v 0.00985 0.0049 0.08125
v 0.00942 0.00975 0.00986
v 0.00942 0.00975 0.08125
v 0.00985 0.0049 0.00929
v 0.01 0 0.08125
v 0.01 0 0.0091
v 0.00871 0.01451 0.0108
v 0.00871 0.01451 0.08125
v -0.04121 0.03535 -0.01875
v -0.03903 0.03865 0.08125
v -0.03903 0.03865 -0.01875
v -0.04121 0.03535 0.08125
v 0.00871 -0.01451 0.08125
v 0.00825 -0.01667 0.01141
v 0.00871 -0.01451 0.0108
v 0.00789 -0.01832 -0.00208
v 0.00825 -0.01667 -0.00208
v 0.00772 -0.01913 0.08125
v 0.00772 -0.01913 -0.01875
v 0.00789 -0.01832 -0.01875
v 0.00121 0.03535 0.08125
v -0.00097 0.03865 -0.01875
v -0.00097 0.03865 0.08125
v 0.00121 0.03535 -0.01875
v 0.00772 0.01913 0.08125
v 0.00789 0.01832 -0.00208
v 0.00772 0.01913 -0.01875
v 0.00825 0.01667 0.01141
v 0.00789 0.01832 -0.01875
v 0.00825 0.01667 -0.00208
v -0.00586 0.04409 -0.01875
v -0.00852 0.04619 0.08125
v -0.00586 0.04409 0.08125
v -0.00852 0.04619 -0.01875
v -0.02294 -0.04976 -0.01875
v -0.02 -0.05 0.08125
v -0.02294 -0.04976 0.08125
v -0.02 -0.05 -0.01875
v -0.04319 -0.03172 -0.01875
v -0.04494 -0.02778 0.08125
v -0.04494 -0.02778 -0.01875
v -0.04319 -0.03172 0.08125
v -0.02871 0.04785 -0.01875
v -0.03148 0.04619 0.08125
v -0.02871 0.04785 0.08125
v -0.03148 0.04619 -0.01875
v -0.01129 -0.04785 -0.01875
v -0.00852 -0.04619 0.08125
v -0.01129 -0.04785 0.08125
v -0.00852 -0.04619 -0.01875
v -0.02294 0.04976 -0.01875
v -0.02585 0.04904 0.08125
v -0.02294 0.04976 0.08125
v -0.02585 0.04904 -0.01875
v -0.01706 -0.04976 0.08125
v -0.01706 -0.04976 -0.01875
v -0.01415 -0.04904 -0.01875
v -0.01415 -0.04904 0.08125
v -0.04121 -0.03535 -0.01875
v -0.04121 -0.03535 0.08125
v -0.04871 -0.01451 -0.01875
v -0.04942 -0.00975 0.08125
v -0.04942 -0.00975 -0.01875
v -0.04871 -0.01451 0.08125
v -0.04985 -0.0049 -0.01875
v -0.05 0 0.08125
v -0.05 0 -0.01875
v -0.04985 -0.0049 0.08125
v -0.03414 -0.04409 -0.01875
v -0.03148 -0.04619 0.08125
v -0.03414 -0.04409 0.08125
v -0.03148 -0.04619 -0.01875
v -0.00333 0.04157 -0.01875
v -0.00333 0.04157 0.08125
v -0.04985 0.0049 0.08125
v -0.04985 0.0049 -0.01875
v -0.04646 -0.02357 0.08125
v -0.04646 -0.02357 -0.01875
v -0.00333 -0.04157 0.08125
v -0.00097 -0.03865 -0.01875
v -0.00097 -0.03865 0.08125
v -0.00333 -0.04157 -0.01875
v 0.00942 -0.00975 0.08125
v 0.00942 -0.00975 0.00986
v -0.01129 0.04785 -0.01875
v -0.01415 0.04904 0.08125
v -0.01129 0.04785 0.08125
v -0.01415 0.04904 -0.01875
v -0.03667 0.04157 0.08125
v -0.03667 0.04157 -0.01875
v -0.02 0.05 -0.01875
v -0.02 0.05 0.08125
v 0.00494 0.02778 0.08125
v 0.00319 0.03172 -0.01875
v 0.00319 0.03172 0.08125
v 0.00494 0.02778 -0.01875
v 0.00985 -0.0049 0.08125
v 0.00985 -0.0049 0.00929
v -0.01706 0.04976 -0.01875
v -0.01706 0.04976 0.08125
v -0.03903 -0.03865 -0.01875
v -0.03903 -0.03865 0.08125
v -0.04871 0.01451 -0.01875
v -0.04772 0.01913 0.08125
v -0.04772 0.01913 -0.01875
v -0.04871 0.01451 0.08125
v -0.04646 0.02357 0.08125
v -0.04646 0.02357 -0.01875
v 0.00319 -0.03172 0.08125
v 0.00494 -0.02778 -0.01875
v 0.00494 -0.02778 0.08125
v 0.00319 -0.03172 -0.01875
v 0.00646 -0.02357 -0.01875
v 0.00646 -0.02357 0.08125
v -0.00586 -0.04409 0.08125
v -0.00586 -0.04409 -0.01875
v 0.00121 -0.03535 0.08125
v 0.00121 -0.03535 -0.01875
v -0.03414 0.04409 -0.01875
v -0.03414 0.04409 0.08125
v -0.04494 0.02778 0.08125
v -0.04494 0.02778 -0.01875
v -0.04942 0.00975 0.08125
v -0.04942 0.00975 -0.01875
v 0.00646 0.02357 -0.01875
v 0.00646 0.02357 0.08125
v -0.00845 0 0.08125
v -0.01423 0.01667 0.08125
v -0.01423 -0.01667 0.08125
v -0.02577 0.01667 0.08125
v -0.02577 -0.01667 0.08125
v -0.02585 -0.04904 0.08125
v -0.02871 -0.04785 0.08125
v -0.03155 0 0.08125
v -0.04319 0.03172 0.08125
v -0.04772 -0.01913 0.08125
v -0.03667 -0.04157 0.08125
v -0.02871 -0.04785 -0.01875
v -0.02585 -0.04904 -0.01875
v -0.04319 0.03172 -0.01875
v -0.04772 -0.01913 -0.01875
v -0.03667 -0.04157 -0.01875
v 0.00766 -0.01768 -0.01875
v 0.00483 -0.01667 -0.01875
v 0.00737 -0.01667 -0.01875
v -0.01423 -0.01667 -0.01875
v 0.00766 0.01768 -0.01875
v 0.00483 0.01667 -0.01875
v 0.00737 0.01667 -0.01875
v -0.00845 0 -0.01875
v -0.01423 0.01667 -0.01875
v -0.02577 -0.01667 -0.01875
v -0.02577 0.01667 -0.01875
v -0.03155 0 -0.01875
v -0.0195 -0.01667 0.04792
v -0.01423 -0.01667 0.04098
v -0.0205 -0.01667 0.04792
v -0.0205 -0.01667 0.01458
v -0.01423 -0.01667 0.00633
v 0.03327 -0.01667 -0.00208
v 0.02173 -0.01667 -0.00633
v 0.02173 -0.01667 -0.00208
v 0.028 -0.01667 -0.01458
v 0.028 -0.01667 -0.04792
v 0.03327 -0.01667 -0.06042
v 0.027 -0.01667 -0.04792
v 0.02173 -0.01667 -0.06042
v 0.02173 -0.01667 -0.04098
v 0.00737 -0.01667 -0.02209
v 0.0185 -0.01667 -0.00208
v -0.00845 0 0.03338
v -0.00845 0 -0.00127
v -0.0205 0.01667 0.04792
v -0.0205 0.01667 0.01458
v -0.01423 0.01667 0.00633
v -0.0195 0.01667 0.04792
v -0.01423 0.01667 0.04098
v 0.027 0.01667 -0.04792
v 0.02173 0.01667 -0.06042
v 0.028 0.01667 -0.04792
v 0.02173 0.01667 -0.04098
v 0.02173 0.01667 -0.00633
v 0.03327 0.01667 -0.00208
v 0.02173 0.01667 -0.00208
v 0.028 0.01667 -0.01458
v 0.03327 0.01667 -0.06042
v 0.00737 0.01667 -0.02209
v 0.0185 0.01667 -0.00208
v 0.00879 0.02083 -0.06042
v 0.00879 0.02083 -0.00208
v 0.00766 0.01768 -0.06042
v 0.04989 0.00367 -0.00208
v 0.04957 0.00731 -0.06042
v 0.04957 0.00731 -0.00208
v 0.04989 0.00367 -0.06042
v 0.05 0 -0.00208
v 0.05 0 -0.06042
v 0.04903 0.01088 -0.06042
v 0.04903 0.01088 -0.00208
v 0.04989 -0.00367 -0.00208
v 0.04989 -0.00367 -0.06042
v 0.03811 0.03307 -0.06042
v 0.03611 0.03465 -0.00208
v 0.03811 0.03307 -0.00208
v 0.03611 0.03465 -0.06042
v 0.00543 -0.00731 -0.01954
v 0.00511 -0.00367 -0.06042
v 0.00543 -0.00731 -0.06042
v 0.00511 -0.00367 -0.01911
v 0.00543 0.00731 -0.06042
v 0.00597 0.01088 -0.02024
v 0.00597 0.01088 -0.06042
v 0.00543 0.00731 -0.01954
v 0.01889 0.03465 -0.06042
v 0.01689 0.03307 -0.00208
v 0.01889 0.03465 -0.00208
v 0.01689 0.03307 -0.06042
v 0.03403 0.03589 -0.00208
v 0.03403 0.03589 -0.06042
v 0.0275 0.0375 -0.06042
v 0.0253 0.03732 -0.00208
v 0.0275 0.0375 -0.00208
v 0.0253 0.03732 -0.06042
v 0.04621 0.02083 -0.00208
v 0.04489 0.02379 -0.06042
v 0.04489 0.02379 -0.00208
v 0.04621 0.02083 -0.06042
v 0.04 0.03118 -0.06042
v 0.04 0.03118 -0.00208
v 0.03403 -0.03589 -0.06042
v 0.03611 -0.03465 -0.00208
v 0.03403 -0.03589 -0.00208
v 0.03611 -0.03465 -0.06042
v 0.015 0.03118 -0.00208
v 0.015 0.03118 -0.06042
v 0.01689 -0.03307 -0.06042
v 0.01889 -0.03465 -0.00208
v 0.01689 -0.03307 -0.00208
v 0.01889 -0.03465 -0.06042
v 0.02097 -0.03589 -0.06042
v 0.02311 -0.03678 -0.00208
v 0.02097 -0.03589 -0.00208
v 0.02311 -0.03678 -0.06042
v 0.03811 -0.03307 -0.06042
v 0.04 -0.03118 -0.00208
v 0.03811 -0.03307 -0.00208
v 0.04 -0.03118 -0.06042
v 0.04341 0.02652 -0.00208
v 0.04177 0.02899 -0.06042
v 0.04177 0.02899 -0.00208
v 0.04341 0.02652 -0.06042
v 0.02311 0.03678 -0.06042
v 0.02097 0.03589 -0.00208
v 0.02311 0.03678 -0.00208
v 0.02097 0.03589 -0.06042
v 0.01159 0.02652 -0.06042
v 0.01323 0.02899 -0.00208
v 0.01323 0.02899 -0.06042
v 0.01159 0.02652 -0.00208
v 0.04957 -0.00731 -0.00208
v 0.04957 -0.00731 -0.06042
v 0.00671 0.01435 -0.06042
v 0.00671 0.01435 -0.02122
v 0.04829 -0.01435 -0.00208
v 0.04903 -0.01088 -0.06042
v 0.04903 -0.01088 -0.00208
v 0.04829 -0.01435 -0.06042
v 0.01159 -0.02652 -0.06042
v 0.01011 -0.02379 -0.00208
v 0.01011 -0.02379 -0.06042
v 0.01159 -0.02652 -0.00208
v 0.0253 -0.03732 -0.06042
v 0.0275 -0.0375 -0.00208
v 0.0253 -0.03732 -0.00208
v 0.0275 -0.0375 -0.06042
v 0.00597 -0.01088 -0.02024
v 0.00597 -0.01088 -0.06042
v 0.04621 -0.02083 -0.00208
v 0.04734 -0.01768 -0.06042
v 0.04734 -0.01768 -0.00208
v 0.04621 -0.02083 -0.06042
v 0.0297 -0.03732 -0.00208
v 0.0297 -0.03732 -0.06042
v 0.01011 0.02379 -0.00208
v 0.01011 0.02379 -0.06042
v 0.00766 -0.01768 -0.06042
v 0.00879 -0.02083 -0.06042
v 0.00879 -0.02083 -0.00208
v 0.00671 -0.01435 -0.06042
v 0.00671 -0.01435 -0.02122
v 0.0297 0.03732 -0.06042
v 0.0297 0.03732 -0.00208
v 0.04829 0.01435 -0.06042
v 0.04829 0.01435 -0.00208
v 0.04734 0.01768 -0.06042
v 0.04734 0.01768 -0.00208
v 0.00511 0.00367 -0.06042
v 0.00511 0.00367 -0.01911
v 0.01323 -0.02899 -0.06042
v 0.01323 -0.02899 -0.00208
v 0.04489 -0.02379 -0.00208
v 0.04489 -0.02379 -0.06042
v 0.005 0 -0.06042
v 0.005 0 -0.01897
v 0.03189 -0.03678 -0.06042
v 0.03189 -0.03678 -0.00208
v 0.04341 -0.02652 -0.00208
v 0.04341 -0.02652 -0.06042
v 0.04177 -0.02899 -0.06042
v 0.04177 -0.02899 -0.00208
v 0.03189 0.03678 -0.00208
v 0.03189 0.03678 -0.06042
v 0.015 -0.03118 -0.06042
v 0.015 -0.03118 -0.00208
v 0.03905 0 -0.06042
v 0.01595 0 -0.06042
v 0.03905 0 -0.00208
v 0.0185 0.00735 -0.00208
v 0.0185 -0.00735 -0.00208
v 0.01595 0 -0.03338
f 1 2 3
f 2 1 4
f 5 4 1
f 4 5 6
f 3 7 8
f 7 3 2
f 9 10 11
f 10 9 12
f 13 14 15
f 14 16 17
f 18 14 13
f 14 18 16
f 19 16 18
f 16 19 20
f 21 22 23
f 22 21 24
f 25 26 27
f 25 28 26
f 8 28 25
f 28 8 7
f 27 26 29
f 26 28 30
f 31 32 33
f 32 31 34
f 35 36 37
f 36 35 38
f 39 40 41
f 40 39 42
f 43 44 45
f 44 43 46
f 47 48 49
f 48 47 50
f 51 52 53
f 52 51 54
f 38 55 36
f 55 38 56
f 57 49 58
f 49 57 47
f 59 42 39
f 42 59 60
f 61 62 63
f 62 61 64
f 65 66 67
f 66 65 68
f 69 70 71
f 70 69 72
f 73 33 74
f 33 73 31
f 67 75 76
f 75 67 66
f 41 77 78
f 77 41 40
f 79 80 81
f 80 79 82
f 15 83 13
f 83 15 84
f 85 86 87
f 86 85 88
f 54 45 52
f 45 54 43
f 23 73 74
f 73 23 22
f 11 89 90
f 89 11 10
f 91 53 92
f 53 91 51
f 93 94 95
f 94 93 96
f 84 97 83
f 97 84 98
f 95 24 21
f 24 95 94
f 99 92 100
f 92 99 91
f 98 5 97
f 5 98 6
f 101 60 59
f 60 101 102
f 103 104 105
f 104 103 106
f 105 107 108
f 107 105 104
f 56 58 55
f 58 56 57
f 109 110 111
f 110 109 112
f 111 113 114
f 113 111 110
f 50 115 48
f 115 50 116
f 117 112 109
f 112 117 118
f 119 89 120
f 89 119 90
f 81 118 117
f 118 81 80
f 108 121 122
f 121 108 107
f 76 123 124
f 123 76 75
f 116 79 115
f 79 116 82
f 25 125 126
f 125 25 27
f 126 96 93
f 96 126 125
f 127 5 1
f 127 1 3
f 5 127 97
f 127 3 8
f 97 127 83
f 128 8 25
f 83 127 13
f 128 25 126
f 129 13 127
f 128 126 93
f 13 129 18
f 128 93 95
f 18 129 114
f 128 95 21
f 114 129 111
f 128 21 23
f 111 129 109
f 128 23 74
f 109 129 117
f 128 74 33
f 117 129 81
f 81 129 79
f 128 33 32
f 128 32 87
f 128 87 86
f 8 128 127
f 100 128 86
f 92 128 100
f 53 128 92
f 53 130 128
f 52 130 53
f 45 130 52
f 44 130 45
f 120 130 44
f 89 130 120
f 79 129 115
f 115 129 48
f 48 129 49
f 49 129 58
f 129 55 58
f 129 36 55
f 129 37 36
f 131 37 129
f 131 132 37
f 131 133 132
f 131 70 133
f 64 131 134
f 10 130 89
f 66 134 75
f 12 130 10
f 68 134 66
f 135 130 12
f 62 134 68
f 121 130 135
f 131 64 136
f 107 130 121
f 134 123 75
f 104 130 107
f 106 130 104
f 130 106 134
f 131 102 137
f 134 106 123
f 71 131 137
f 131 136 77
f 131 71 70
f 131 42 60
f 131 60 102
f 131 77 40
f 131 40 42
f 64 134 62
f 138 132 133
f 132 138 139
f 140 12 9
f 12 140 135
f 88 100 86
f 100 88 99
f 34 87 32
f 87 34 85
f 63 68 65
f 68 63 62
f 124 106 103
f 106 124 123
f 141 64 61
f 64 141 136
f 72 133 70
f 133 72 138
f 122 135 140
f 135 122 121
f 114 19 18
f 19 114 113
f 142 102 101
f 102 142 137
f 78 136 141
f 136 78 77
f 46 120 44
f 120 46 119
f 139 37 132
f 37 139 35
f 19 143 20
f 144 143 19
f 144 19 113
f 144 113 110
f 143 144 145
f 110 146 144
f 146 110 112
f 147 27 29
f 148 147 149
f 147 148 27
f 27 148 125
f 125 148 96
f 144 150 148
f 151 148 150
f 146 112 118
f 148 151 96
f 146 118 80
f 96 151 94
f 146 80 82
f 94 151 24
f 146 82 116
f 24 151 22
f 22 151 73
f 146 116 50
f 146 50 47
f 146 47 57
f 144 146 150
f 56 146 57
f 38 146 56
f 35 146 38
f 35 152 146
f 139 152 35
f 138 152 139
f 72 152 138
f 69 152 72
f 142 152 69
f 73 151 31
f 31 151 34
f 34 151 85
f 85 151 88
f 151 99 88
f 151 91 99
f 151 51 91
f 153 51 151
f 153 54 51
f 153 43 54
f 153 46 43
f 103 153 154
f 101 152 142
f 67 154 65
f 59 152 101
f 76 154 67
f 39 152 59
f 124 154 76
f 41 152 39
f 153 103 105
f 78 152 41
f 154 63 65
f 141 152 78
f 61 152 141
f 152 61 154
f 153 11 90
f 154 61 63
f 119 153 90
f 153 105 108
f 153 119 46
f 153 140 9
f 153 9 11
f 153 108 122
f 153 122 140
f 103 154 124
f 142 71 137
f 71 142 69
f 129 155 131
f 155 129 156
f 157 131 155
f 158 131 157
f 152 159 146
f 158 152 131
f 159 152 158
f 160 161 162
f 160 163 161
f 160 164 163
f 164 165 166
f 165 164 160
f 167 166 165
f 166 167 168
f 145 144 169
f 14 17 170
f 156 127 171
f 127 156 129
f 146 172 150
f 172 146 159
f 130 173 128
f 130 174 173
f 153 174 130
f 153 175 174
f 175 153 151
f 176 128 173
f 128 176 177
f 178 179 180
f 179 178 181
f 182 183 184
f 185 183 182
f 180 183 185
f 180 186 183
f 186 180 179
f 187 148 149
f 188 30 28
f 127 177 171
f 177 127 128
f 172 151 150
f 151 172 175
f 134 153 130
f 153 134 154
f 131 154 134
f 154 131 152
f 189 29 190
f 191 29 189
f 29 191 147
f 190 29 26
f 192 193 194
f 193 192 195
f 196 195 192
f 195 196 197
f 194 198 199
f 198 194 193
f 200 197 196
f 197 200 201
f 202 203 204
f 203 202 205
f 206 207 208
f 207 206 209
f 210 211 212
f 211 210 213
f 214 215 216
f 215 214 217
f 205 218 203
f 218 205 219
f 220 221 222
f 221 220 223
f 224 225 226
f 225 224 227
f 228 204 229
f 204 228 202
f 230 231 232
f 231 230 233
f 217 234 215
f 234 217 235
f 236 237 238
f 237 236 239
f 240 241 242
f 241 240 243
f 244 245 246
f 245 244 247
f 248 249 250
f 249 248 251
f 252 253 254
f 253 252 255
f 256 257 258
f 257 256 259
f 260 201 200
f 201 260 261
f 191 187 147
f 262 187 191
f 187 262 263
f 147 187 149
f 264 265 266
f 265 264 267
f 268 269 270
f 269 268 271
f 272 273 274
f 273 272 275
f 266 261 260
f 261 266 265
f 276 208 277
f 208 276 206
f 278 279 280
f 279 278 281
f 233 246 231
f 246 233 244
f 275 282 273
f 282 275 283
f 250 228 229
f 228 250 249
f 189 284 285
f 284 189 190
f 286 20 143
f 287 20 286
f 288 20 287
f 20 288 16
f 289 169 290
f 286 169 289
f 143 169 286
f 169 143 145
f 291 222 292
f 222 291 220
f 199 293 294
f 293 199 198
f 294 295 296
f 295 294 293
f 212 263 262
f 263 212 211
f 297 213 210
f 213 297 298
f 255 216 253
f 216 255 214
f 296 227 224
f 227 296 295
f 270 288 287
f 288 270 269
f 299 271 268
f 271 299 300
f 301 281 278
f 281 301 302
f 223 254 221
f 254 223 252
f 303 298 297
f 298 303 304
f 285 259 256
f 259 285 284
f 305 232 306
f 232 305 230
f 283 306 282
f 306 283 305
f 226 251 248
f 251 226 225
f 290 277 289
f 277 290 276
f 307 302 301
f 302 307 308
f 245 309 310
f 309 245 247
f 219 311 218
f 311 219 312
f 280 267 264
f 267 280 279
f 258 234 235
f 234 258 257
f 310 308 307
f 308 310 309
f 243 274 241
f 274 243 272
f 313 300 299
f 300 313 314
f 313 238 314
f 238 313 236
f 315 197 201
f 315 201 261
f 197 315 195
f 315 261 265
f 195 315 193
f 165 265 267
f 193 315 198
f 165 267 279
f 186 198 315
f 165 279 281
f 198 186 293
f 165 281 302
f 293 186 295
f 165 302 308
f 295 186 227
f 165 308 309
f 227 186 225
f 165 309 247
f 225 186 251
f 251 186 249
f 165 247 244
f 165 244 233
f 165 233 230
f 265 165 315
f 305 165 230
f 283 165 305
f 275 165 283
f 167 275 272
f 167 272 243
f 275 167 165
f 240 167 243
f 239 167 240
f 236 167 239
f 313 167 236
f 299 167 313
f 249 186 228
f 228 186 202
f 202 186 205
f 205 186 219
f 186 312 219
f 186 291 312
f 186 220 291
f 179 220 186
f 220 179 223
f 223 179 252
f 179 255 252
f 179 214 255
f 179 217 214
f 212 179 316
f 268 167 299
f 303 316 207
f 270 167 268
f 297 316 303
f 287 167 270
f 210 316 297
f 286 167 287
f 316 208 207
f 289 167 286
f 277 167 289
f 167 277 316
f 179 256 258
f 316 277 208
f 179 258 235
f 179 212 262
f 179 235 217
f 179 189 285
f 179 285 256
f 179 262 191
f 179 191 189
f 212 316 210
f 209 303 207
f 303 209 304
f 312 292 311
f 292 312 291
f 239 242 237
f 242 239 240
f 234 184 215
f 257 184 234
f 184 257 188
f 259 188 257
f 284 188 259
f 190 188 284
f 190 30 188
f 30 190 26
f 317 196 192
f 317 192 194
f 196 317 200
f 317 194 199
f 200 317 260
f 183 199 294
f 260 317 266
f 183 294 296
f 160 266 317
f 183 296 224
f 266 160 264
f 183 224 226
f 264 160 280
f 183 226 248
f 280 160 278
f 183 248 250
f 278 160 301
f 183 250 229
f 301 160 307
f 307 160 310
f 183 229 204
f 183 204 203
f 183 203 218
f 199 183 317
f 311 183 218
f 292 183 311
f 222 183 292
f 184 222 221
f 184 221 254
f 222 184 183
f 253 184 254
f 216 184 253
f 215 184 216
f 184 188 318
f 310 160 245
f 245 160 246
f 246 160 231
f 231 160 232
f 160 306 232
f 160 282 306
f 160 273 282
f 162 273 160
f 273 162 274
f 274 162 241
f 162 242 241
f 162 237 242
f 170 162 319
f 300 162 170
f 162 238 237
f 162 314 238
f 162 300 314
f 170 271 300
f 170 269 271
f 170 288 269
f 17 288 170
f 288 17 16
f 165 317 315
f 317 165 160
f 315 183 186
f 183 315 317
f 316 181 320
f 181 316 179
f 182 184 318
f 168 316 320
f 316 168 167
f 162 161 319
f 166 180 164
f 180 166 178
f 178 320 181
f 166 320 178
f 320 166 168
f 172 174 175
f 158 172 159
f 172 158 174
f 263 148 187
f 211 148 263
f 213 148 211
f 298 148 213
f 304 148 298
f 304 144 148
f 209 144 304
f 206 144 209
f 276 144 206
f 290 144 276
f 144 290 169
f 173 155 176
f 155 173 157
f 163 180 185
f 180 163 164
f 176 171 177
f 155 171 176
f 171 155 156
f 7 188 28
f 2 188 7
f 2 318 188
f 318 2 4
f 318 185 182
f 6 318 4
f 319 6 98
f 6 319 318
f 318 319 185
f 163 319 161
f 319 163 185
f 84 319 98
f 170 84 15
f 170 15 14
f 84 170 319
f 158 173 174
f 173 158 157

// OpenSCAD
$fn=64;

bbox = [0.1, 0.1, 0.1];

len = 0.1;
boss_big_d = 0.06;
boss_small_d = 0.045;

boss_big_t = 0.06;
boss_small_t = 0.035;

bar_w = 0.02;
bar_t = 0.02;

offset_z = (boss_big_t - boss_small_t);

hex_flat = 0.02;
hex_r = hex_flat / sqrt(3);

module hex_hole(h, r){
    cylinder(h=h, r=r, $fn=6);
}

module boss(d, t, hex_r){
    difference(){
        cylinder(h=t, d=d);
        translate([0,0,-0.01]) hex_hole(t+0.02, hex_r);
    }
}

module bar_between(x0, x1, w, t, z0, z1){
    hull(){
        translate([x0,0,z0]) cube([0.001, w, t], center=true);
        translate([x1,0,z1]) cube([0.001, w, t], center=true);
    }
}

module offset_link(){
    x_big = -len/2 + boss_big_d/2;
    x_small =  len/2 - boss_small_d/2;

    z_big = 0;
    z_small = -offset_z;

    union(){
        translate([x_big,0,z_big]) boss(boss_big_d, boss_big_t, hex_r);
        translate([x_small,0,z_small]) boss(boss_small_d, boss_small_t, hex_r);

        bar_between(x_big, x_small, bar_w, bar_t, boss_big_t/2, z_small + boss_small_t/2);
    }
}

scale_f = [
    bbox[0]/len,
    bbox[1]/max(boss_big_d, bar_w),
    bbox[2]/max(boss_big_t, boss_small_t + abs(offset_z))
];

scale(scale_f)
translate([0,0,-(boss_big_t/2 + (-offset_z + boss_small_t/2))/2])
offset_link();
